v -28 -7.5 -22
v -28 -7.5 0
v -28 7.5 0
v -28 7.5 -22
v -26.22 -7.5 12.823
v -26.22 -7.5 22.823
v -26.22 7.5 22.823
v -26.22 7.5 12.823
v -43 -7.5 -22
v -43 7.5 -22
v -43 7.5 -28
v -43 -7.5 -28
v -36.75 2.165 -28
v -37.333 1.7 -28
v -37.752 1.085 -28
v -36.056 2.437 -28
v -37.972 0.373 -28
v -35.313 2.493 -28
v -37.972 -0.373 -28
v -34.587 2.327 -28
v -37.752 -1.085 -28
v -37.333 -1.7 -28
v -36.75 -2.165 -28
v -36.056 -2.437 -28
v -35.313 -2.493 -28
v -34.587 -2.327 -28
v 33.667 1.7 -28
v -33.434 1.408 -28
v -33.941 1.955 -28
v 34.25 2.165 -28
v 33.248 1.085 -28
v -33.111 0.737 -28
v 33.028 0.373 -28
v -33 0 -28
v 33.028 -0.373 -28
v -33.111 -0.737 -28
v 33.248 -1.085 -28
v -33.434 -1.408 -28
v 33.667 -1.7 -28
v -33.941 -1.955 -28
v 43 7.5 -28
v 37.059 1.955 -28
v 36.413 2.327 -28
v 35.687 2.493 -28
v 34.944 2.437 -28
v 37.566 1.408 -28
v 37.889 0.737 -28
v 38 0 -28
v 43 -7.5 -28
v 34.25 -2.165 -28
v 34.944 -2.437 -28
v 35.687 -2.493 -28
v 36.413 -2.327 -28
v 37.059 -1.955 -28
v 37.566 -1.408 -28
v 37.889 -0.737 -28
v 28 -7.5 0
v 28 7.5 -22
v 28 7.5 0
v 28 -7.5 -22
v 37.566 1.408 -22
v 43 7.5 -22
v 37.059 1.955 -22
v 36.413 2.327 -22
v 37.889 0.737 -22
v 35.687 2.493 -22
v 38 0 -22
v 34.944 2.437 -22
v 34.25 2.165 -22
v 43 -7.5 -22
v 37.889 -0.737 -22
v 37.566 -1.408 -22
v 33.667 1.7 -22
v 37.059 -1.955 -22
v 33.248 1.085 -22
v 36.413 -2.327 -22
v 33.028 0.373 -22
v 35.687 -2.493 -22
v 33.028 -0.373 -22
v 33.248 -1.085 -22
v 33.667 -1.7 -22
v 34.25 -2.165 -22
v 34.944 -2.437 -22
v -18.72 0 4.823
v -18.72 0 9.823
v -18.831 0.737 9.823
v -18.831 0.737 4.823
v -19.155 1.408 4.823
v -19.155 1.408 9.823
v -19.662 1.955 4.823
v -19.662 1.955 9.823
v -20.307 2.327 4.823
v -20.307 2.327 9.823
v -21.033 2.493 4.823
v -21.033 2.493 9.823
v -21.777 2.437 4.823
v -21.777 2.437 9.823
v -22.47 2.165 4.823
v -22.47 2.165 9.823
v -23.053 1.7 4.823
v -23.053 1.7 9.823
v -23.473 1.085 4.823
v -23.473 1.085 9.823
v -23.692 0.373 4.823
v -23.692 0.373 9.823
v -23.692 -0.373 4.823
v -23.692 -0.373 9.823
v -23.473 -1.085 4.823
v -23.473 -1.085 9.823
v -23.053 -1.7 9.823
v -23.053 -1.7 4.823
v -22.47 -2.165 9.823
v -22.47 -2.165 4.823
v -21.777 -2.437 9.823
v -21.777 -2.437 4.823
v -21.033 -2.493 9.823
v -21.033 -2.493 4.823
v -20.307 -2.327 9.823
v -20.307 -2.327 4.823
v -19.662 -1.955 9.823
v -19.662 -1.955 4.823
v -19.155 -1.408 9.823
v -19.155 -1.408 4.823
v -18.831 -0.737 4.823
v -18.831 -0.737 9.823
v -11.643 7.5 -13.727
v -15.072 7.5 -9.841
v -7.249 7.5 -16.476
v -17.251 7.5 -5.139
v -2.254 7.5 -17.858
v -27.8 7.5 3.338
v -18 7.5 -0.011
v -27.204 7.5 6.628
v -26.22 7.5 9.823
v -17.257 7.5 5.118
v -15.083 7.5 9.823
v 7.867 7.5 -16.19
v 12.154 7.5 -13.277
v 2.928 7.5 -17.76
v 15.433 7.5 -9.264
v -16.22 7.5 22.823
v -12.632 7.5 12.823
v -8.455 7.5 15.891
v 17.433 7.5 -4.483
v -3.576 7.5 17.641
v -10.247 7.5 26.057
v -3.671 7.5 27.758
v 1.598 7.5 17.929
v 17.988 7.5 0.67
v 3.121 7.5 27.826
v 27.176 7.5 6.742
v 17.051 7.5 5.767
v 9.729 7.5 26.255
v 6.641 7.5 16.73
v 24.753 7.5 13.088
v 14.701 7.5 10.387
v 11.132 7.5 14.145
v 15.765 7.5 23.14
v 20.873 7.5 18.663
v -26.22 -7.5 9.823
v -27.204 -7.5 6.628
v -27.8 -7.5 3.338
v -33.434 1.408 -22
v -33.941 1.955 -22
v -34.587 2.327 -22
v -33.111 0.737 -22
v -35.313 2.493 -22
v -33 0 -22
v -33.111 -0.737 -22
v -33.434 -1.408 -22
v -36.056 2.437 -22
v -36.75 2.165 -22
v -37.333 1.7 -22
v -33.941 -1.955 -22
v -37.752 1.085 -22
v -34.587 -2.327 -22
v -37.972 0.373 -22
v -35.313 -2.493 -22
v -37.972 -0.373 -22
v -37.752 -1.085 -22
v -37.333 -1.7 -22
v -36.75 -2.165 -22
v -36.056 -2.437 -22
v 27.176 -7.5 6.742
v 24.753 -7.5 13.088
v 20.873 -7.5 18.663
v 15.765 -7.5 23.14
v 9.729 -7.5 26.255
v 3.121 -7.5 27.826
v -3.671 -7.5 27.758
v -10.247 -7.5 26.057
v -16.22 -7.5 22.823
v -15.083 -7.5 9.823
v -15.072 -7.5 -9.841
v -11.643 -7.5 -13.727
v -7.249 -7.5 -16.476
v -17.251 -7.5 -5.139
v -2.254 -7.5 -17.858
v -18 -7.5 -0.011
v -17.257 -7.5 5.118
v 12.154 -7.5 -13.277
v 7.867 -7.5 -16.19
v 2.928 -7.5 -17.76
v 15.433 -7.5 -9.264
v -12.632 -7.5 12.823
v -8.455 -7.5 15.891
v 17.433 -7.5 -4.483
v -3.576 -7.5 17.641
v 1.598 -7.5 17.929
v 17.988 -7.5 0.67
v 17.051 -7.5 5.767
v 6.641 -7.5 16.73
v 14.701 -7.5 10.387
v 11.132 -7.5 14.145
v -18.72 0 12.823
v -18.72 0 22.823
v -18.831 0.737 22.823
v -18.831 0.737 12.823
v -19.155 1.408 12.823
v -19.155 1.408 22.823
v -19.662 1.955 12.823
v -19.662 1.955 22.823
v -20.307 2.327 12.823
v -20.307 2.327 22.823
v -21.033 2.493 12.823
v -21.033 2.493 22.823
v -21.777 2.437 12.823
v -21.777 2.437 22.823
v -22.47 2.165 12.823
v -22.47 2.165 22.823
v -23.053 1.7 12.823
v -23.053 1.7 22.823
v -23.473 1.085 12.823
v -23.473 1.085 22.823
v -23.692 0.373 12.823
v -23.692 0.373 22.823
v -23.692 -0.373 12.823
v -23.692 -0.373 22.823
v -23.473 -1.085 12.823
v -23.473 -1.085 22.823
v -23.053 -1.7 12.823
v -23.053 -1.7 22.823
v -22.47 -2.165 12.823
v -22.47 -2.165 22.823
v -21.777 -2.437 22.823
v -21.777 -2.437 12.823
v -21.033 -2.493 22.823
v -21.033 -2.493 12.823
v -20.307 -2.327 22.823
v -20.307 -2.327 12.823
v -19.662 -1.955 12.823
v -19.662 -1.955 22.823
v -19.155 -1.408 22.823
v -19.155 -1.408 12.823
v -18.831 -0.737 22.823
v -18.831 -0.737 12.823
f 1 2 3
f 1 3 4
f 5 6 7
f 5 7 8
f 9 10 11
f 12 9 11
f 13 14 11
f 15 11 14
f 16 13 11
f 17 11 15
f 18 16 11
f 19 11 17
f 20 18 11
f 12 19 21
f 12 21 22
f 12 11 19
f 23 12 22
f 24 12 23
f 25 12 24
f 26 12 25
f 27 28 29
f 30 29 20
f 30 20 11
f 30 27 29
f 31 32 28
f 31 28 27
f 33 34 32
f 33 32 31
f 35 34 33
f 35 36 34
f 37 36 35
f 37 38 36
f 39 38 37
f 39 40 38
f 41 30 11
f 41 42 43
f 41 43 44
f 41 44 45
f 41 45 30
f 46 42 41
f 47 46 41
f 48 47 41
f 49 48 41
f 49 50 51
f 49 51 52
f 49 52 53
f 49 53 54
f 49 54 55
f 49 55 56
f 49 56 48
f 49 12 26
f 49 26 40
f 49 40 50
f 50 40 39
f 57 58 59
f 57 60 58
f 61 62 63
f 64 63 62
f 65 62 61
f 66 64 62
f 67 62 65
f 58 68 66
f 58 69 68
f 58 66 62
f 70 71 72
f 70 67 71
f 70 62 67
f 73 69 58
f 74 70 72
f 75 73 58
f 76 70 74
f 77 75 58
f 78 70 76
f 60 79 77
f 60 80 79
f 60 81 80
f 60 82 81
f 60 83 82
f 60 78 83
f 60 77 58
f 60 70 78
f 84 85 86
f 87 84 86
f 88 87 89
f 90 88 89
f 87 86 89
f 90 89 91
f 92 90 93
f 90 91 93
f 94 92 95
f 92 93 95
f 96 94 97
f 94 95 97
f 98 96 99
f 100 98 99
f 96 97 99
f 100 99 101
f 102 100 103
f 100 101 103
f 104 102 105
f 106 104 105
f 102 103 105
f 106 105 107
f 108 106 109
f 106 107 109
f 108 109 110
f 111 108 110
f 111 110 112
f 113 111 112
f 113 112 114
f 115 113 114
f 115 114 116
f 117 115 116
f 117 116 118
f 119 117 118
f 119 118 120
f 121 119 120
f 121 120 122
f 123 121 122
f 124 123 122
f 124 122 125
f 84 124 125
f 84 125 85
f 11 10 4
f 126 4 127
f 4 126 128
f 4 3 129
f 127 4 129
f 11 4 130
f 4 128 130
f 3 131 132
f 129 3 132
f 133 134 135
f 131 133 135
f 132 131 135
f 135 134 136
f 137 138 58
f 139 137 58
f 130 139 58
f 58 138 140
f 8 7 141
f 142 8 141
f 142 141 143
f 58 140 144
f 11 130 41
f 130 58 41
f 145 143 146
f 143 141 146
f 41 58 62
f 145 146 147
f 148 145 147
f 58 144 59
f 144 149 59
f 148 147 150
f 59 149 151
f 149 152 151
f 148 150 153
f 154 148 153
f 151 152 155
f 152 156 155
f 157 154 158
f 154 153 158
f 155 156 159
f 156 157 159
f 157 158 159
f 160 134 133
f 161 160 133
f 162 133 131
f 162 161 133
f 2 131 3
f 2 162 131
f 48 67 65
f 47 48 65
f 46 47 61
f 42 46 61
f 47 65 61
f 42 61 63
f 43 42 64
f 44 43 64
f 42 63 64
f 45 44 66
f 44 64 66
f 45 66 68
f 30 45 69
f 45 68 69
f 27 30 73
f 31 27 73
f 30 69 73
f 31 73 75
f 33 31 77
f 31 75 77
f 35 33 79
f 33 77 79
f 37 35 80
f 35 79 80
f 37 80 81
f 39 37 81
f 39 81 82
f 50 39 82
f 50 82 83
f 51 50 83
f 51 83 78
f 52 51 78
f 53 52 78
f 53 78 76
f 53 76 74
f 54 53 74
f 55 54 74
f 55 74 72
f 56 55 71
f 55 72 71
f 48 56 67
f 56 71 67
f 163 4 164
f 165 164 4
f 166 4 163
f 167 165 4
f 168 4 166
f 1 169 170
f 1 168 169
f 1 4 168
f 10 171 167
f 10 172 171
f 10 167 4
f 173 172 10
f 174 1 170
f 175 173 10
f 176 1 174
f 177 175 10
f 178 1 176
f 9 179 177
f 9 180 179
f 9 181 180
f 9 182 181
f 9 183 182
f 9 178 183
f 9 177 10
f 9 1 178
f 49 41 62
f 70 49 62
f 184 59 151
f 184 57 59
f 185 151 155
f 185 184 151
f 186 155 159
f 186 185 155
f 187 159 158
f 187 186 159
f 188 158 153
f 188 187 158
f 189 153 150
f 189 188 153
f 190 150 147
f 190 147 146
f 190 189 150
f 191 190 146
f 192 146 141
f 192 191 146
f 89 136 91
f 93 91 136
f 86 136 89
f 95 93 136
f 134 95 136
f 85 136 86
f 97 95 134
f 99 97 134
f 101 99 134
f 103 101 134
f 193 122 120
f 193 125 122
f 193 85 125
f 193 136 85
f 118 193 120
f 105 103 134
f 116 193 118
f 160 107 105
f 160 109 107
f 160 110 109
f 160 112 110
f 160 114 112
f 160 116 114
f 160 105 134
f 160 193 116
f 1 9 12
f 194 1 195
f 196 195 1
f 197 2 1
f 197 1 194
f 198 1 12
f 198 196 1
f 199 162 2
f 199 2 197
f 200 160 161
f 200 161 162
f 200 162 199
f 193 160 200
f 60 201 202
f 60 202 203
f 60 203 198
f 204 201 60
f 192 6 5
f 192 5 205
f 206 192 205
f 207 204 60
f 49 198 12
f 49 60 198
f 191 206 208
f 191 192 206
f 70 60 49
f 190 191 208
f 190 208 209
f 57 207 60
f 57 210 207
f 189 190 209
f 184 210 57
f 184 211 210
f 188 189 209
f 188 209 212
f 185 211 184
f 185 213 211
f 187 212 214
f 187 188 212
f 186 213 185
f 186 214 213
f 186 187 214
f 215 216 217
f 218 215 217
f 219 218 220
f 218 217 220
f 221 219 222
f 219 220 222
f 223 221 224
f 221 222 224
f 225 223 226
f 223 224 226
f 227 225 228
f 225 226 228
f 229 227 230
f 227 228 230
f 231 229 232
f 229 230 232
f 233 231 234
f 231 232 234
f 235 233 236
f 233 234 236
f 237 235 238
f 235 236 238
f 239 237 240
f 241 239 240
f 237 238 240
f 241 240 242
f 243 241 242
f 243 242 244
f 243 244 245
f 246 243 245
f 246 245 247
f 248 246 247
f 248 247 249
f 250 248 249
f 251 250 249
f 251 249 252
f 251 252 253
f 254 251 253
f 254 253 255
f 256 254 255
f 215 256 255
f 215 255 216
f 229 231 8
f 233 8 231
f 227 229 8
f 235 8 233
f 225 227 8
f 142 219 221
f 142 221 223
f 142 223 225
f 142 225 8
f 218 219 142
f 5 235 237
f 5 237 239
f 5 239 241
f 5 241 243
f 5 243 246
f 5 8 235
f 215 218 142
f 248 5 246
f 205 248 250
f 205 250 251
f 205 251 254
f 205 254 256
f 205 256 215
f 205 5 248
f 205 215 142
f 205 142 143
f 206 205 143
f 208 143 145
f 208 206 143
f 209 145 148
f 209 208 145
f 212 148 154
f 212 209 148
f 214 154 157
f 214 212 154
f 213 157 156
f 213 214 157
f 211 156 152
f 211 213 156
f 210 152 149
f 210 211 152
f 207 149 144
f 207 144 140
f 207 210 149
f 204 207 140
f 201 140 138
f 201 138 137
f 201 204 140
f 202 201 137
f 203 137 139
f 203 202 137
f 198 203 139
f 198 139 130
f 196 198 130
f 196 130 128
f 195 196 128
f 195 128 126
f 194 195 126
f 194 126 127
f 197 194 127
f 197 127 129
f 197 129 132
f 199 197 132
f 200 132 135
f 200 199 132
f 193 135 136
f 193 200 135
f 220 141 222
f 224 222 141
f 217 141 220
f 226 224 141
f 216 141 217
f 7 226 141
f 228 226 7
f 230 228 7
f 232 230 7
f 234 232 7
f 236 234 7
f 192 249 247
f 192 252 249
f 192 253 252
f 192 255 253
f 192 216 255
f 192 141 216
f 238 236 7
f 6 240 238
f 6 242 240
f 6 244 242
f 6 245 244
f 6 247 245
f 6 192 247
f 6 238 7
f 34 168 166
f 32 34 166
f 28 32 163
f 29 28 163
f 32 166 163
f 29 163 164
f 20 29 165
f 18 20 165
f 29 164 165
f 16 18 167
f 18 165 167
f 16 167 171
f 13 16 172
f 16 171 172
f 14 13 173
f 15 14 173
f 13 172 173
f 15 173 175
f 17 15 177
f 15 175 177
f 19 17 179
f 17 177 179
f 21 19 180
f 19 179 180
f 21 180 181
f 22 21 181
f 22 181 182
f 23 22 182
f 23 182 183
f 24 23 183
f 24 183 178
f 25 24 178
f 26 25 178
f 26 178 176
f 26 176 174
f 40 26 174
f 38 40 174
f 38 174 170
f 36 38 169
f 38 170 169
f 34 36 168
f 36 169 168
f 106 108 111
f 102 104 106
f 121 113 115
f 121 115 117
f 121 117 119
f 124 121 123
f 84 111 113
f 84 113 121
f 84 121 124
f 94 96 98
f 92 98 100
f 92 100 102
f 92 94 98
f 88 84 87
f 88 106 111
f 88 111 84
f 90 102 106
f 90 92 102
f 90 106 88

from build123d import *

# Parameters (mm, degrees)
F1_DEPTH = 7.5
F2_R     = 2.5
F3_DEPTH = 6
F4_R     = 2.5
F5_DEPTH = 18


with BuildPart() as f1:
    # F0 (on Front) → F1 (new body, symmetric)
    with BuildSketch(Plane.XZ):
        with BuildLine():
            ThreePointArc((28, 0), (12.841967, 24.881396), (-16.220278, 22.823291))
            Line((-16.220278, 22.823291), (-26.220278, 22.823291))
            Line((-26.220278, 22.823291), (-26.220278, 12.823291))
            Line((-26.220278, 12.823291), (-12.631834, 12.823291))
            ThreePointArc((-12.631834, 12.823291), (13.938464, -11.389434), (-15.083201, 9.823291))
            Line((-15.083201, 9.823291), (-26.220278, 9.823291))
            ThreePointArc((-26.220278, 9.823291), (-27.551477, 4.991604), (-28, 0))
            Line((-28, 0), (-28, -22))
            Line((-28, -22), (-43, -22))
            Line((-43, -22), (-43, -28))
            Line((-43, -28), (43, -28))
            Line((43, -28), (43, -22))
            Line((43, -22), (28, -22))
            Line((28, -22), (28, 0))
        make_face()
    extrude(amount=F1_DEPTH, both=True)

    # F2 (on face) → F3 (cut, through all)
    with BuildSketch(Plane.XY.offset(-22)):
        with Locations((-35.5, 0)):
            Circle(F2_R)
        with Locations((35.5, 0)):
            Circle(F2_R)
    extrude(amount=-F3_DEPTH, mode=Mode.SUBTRACT)

    # F4 (on face) → F5 (cut)
    with BuildSketch(Plane.XY.offset(22.823291)):
        with Locations((-21.220278, 0)):
            Circle(F4_R)
    extrude(amount=-F5_DEPTH, mode=Mode.SUBTRACT)


solid = f1.part
